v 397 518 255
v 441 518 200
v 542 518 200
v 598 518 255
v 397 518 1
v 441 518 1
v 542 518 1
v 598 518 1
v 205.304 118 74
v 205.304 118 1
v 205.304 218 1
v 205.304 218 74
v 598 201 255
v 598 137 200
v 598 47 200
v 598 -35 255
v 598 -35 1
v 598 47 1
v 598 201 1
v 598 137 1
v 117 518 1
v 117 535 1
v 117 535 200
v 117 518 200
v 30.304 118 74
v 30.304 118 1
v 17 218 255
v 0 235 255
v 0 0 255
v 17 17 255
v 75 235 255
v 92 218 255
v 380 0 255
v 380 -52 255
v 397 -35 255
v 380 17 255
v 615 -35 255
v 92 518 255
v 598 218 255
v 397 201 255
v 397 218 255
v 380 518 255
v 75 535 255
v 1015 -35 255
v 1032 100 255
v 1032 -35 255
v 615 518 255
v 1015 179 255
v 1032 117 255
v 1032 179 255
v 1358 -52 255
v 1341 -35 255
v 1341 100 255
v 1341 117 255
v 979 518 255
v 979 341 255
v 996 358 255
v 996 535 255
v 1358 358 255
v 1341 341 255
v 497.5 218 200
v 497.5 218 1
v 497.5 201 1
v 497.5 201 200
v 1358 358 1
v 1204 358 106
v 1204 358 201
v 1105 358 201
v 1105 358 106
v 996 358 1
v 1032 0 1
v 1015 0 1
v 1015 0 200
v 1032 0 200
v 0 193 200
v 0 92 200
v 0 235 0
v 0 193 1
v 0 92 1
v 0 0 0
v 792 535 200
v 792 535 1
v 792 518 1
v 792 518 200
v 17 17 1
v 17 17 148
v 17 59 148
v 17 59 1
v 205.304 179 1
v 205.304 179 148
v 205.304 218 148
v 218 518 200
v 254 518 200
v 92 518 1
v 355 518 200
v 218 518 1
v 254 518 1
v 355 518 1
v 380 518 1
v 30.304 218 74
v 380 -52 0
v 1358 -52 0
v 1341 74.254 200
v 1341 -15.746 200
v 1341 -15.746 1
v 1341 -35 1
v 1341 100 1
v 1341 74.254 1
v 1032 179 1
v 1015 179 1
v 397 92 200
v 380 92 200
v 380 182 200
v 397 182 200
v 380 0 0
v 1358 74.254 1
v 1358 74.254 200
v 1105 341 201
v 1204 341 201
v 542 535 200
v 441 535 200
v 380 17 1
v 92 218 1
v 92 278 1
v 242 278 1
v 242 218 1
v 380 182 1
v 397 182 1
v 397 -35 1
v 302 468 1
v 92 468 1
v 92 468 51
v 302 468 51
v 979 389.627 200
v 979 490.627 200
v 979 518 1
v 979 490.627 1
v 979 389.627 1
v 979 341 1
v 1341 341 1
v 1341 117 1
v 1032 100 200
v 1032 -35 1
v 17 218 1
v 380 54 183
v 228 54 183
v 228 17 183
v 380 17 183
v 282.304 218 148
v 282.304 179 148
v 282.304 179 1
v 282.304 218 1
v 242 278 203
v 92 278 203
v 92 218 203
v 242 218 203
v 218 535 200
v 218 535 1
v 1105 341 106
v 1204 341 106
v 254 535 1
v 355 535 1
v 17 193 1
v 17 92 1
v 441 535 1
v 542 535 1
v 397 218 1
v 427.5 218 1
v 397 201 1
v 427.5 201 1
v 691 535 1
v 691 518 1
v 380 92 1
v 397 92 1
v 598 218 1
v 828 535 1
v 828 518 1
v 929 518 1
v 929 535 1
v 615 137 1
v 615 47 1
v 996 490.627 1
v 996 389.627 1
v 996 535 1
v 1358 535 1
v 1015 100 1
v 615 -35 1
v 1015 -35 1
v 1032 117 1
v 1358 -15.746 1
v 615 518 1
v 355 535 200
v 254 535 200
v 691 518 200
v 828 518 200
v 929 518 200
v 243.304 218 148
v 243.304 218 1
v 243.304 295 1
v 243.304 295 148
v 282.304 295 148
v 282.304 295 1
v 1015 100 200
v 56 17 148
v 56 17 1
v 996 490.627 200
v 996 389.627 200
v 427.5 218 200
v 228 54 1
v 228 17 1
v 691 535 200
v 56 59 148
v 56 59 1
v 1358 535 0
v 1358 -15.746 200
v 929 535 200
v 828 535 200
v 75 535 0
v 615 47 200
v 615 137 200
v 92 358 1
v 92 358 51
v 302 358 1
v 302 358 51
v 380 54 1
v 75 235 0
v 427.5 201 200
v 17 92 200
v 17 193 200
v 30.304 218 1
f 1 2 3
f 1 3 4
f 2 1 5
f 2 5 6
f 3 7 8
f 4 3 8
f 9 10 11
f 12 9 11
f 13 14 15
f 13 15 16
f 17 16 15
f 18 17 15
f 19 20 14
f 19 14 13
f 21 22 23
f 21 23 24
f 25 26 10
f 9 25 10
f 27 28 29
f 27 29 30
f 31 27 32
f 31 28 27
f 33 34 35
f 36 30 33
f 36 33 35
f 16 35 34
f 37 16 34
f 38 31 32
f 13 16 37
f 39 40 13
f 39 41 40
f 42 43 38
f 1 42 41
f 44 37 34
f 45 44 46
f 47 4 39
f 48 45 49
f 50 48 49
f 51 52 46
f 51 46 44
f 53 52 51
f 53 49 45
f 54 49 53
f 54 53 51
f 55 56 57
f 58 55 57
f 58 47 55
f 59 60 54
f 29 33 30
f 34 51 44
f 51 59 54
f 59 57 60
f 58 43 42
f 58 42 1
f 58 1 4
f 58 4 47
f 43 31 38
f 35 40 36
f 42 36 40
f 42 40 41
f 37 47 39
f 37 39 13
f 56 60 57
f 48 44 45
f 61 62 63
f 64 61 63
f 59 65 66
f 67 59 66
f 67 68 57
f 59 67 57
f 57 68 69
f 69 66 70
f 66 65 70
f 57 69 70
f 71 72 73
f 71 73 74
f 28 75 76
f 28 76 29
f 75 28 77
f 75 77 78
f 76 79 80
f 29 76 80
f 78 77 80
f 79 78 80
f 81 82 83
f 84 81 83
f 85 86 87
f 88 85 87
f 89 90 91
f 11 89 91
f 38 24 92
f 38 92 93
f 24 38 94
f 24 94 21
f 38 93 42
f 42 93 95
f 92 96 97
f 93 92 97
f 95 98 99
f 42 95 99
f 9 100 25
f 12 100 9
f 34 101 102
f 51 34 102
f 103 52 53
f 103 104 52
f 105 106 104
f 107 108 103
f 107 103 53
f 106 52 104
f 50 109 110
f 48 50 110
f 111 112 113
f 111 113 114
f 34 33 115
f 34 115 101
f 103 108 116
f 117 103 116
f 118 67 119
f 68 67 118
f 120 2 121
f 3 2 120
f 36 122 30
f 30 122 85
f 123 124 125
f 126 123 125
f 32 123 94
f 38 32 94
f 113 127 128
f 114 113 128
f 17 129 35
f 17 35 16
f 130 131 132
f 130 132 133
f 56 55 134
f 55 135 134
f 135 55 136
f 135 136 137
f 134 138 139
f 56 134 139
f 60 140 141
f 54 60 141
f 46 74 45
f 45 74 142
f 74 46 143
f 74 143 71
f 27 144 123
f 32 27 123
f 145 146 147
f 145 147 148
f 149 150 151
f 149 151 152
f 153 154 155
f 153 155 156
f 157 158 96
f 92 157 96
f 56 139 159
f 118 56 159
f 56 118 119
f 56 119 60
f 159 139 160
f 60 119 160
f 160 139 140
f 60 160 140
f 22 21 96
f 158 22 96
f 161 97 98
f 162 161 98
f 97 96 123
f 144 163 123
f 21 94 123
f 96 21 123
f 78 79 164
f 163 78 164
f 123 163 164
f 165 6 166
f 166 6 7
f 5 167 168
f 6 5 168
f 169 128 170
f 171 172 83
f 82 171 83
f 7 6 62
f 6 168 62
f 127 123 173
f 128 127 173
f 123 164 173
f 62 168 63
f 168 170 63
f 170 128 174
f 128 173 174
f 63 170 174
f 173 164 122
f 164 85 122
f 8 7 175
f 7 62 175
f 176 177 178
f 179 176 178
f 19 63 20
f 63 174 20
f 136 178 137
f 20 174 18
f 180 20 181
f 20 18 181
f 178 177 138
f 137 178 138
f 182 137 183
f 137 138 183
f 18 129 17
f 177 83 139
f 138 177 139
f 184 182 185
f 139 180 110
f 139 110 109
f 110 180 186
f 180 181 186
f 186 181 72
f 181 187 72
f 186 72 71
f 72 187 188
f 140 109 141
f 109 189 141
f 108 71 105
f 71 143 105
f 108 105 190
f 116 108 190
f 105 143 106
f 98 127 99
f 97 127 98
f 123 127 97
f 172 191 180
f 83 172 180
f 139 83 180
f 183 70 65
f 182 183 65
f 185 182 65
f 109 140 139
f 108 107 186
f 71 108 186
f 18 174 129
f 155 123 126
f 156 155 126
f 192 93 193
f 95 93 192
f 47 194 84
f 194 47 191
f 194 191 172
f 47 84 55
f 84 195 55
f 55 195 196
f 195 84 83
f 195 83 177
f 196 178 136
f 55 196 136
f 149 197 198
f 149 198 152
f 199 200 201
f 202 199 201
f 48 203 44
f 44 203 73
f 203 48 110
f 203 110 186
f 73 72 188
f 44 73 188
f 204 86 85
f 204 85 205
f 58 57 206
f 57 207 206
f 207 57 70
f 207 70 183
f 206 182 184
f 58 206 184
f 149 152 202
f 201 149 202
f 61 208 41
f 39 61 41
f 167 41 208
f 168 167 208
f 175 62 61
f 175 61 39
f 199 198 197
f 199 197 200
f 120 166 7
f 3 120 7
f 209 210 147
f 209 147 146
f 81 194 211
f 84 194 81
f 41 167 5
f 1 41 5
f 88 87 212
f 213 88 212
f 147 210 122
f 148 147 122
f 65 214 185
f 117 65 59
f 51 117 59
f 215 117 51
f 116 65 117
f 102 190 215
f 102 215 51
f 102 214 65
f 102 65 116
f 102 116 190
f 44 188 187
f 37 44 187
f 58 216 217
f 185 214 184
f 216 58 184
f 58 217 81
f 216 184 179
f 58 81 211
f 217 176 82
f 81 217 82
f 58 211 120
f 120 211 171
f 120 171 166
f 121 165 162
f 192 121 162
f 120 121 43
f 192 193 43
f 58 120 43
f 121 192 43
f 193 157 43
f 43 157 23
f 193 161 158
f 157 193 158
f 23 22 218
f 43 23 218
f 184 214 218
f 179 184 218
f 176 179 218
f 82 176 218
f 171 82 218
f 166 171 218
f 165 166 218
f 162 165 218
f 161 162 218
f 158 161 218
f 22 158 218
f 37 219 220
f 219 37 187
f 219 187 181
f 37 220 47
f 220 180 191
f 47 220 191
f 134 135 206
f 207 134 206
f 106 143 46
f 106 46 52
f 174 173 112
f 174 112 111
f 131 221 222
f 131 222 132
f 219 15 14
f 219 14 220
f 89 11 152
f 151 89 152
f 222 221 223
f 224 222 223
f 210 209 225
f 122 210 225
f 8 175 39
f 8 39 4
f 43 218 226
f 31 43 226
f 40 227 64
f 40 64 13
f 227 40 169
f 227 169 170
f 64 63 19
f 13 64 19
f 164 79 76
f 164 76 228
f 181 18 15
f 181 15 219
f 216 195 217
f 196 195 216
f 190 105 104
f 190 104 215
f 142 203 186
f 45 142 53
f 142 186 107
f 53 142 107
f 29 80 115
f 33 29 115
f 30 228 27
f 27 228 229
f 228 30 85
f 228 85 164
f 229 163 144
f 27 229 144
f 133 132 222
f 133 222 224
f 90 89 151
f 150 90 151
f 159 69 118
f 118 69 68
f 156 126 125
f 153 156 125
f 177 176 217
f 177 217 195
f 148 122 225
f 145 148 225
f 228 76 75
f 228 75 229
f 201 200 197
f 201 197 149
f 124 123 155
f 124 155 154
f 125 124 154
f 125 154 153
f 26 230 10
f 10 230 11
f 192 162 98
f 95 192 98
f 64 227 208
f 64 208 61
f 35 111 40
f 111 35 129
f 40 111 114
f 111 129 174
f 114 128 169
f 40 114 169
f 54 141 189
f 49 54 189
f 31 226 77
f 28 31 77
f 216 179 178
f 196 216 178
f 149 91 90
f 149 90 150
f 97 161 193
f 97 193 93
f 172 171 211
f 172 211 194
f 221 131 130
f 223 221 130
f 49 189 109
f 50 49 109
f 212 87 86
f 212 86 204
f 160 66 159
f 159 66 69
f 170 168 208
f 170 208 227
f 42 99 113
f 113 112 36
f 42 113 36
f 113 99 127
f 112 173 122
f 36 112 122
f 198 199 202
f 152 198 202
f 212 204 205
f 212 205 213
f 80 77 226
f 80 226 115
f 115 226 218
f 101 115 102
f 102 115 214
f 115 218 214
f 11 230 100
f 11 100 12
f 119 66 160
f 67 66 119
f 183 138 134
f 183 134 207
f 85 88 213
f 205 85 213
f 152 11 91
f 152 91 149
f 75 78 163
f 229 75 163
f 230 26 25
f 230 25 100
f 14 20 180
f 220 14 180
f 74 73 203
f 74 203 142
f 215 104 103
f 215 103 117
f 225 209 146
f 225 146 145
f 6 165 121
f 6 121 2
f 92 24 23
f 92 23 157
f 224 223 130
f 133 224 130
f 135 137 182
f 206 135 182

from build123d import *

# Parameters (mm, degrees)
F0_W      = 201
F0_H      = 236
F0_W_2    = 309
F0_H_2    = 135
F0_H_3    = 300
F1_DEPTH  = 255
F2_W      = 101
F2_H      = 17
F2_W_2    = 17
F2_H_2    = 90
F2_H_3    = 101
F2_W_3    = 70
F2_H_4    = 100
F3_DEPTH  = 200
F5_DEPTH  = 1
F6_W      = 175
F6_H      = 100
F7_DEPTH  = 73
F8_W      = 152
F8_H      = 37
F9_DEPTH  = 182
F10_W     = 210
F10_H     = 110
F11_DEPTH = 50
F12_W     = 150
F12_H     = 60
F13_DEPTH = 202
F14_W     = 77
F14_H     = 39
F15_DEPTH = 147
F16_W     = 39
F16_H     = 77
F17_DEPTH = 147
F18_W     = 39
F18_H     = 42
F19_DEPTH = 147
F20_W     = 99
F20_H     = 95
F21_DEPTH = 25


with BuildPart() as f1:
    # F0 (on Top) → F1 (new body)
    with BuildSketch(Plane.XY):
        Polygon((0, 235), (0, 0), (380, 0), (380, -52), (1358, -52), (1358, 358), (996, 358), (996, 535), (75, 535), (75, 235), align=None)
        with Locations((497.5, 83)):
            Rectangle(F0_W, F0_H, mode=Mode.SUBTRACT)
        with Locations((1186.5, 32.5)):
            Rectangle(F0_W_2, F0_H_2, mode=Mode.SUBTRACT)
        Polygon((92, 218), (92, 518), (380, 518), (380, 17), (17, 17), (17, 218), align=None, mode=Mode.SUBTRACT)
        with Locations((497.5, 368)):
            Rectangle(F0_W, F0_H_3, mode=Mode.SUBTRACT)
        Polygon((615, 518), (979, 518), (979, 341), (1341, 341), (1341, 117), (1032, 117), (1032, 179), (1015, 179), (1015, -35), (615, -35), align=None, mode=Mode.SUBTRACT)
    extrude(amount=F1_DEPTH)

    # F2 (on face) → F3 (cut)
    with BuildSketch(Plane(origin=(0, 0, 0), x_dir=(1, 0, 0), z_dir=(0, 0, -1))):
        with Locations((167.5, -526.5)):
            Rectangle(F2_W, F2_H)
        with Locations((304.5, -526.5)):
            Rectangle(F2_W, F2_H)
        with Locations((388.5, -137)):
            Rectangle(F2_W_2, F2_H_2)
        with Locations((8.5, -142.5)):
            Rectangle(F2_W_2, F2_H_3)
        with Locations((491.5, -526.5)):
            Rectangle(F2_W, F2_H)
        with Locations((741.5, -526.5)):
            Rectangle(F2_W, F2_H)
        with Locations((878.5, -526.5)):
            Rectangle(F2_W, F2_H)
        with Locations((462.5, -209.5)):
            Rectangle(F2_W_3, F2_H)
        with Locations((606.5, -92)):
            Rectangle(F2_W_2, F2_H_2)
        with Locations((1023.5, -50)):
            Rectangle(F2_W_2, F2_H_4)
        with Locations((987.5, -440.127259)):
            Rectangle(F2_W_2, F2_H_3)
        with Locations((1349.5, -29.254282)):
            Rectangle(F2_W_2, F2_H_2)
    extrude(amount=-F3_DEPTH, mode=Mode.SUBTRACT)

    # F4 (on face) → F5 (join)
    with BuildSketch(Plane(origin=(0, 0, 0), x_dir=(1, 0, 0), z_dir=(0, 0, -1))):
        Polygon((75, -535), (1358, -535), (1358, 52), (380, 52), (380, 0), (0, 0), (0, -235), (75, -235), align=None)
    extrude(amount=-F5_DEPTH)

    # F20 (on face) → F21 (cut)
    with BuildSketch(Plane(origin=(0, 358, 0), x_dir=(-1, 0, 0), z_dir=(0, 1, 0))):
        with Locations((-1154.5, 153.5)):
            Rectangle(F20_W, F20_H)
    extrude(amount=-F21_DEPTH, mode=Mode.SUBTRACT)


with BuildPart() as f7:
    # F6 (on face) → F7 (new body)
    with BuildSketch(Plane.XY.offset(1)):
        with Locations((117.803695, 168)):
            Rectangle(F6_W, F6_H)
    extrude(amount=F7_DEPTH)


with BuildPart() as f9:
    # F8 (on face) → F9 (new body)
    with BuildSketch(Plane.XY.offset(1)):
        with Locations((304, 35.5)):
            Rectangle(F8_W, F8_H)
    extrude(amount=F9_DEPTH)


with BuildPart() as f11:
    # F10 (on face) → F11 (new body)
    with BuildSketch(Plane.XY.offset(1)):
        with Locations((197, 413)):
            Rectangle(F10_W, F10_H)
    extrude(amount=F11_DEPTH)


with BuildPart() as f13:
    # F12 (on face) → F13 (new body)
    with BuildSketch(Plane.XY.offset(1)):
        with Locations((167, 248)):
            Rectangle(F12_W, F12_H)
    extrude(amount=F13_DEPTH)


with BuildPart() as f15:
    # F14 (on face) → F15 (new body)
    with BuildSketch(Plane.XY.offset(1)):
        with Locations((243.803695, 198.5)):
            Rectangle(F14_W, F14_H)
    extrude(amount=F15_DEPTH)


with BuildPart() as f17:
    # F16 (on face) → F17 (new body)
    with BuildSketch(Plane.XY.offset(1)):
        with Locations((262.803695, 256.5)):
            Rectangle(F16_W, F16_H)
    extrude(amount=F17_DEPTH)


with BuildPart() as f19:
    # F18 (on face) → F19 (new body)
    with BuildSketch(Plane.XY.offset(1)):
        with Locations((36.5, 38)):
            Rectangle(F18_W, F18_H)
    extrude(amount=F19_DEPTH)


solid = Compound([f1.part, f7.part, f9.part, f11.part, f13.part, f15.part, f17.part, f19.part])
